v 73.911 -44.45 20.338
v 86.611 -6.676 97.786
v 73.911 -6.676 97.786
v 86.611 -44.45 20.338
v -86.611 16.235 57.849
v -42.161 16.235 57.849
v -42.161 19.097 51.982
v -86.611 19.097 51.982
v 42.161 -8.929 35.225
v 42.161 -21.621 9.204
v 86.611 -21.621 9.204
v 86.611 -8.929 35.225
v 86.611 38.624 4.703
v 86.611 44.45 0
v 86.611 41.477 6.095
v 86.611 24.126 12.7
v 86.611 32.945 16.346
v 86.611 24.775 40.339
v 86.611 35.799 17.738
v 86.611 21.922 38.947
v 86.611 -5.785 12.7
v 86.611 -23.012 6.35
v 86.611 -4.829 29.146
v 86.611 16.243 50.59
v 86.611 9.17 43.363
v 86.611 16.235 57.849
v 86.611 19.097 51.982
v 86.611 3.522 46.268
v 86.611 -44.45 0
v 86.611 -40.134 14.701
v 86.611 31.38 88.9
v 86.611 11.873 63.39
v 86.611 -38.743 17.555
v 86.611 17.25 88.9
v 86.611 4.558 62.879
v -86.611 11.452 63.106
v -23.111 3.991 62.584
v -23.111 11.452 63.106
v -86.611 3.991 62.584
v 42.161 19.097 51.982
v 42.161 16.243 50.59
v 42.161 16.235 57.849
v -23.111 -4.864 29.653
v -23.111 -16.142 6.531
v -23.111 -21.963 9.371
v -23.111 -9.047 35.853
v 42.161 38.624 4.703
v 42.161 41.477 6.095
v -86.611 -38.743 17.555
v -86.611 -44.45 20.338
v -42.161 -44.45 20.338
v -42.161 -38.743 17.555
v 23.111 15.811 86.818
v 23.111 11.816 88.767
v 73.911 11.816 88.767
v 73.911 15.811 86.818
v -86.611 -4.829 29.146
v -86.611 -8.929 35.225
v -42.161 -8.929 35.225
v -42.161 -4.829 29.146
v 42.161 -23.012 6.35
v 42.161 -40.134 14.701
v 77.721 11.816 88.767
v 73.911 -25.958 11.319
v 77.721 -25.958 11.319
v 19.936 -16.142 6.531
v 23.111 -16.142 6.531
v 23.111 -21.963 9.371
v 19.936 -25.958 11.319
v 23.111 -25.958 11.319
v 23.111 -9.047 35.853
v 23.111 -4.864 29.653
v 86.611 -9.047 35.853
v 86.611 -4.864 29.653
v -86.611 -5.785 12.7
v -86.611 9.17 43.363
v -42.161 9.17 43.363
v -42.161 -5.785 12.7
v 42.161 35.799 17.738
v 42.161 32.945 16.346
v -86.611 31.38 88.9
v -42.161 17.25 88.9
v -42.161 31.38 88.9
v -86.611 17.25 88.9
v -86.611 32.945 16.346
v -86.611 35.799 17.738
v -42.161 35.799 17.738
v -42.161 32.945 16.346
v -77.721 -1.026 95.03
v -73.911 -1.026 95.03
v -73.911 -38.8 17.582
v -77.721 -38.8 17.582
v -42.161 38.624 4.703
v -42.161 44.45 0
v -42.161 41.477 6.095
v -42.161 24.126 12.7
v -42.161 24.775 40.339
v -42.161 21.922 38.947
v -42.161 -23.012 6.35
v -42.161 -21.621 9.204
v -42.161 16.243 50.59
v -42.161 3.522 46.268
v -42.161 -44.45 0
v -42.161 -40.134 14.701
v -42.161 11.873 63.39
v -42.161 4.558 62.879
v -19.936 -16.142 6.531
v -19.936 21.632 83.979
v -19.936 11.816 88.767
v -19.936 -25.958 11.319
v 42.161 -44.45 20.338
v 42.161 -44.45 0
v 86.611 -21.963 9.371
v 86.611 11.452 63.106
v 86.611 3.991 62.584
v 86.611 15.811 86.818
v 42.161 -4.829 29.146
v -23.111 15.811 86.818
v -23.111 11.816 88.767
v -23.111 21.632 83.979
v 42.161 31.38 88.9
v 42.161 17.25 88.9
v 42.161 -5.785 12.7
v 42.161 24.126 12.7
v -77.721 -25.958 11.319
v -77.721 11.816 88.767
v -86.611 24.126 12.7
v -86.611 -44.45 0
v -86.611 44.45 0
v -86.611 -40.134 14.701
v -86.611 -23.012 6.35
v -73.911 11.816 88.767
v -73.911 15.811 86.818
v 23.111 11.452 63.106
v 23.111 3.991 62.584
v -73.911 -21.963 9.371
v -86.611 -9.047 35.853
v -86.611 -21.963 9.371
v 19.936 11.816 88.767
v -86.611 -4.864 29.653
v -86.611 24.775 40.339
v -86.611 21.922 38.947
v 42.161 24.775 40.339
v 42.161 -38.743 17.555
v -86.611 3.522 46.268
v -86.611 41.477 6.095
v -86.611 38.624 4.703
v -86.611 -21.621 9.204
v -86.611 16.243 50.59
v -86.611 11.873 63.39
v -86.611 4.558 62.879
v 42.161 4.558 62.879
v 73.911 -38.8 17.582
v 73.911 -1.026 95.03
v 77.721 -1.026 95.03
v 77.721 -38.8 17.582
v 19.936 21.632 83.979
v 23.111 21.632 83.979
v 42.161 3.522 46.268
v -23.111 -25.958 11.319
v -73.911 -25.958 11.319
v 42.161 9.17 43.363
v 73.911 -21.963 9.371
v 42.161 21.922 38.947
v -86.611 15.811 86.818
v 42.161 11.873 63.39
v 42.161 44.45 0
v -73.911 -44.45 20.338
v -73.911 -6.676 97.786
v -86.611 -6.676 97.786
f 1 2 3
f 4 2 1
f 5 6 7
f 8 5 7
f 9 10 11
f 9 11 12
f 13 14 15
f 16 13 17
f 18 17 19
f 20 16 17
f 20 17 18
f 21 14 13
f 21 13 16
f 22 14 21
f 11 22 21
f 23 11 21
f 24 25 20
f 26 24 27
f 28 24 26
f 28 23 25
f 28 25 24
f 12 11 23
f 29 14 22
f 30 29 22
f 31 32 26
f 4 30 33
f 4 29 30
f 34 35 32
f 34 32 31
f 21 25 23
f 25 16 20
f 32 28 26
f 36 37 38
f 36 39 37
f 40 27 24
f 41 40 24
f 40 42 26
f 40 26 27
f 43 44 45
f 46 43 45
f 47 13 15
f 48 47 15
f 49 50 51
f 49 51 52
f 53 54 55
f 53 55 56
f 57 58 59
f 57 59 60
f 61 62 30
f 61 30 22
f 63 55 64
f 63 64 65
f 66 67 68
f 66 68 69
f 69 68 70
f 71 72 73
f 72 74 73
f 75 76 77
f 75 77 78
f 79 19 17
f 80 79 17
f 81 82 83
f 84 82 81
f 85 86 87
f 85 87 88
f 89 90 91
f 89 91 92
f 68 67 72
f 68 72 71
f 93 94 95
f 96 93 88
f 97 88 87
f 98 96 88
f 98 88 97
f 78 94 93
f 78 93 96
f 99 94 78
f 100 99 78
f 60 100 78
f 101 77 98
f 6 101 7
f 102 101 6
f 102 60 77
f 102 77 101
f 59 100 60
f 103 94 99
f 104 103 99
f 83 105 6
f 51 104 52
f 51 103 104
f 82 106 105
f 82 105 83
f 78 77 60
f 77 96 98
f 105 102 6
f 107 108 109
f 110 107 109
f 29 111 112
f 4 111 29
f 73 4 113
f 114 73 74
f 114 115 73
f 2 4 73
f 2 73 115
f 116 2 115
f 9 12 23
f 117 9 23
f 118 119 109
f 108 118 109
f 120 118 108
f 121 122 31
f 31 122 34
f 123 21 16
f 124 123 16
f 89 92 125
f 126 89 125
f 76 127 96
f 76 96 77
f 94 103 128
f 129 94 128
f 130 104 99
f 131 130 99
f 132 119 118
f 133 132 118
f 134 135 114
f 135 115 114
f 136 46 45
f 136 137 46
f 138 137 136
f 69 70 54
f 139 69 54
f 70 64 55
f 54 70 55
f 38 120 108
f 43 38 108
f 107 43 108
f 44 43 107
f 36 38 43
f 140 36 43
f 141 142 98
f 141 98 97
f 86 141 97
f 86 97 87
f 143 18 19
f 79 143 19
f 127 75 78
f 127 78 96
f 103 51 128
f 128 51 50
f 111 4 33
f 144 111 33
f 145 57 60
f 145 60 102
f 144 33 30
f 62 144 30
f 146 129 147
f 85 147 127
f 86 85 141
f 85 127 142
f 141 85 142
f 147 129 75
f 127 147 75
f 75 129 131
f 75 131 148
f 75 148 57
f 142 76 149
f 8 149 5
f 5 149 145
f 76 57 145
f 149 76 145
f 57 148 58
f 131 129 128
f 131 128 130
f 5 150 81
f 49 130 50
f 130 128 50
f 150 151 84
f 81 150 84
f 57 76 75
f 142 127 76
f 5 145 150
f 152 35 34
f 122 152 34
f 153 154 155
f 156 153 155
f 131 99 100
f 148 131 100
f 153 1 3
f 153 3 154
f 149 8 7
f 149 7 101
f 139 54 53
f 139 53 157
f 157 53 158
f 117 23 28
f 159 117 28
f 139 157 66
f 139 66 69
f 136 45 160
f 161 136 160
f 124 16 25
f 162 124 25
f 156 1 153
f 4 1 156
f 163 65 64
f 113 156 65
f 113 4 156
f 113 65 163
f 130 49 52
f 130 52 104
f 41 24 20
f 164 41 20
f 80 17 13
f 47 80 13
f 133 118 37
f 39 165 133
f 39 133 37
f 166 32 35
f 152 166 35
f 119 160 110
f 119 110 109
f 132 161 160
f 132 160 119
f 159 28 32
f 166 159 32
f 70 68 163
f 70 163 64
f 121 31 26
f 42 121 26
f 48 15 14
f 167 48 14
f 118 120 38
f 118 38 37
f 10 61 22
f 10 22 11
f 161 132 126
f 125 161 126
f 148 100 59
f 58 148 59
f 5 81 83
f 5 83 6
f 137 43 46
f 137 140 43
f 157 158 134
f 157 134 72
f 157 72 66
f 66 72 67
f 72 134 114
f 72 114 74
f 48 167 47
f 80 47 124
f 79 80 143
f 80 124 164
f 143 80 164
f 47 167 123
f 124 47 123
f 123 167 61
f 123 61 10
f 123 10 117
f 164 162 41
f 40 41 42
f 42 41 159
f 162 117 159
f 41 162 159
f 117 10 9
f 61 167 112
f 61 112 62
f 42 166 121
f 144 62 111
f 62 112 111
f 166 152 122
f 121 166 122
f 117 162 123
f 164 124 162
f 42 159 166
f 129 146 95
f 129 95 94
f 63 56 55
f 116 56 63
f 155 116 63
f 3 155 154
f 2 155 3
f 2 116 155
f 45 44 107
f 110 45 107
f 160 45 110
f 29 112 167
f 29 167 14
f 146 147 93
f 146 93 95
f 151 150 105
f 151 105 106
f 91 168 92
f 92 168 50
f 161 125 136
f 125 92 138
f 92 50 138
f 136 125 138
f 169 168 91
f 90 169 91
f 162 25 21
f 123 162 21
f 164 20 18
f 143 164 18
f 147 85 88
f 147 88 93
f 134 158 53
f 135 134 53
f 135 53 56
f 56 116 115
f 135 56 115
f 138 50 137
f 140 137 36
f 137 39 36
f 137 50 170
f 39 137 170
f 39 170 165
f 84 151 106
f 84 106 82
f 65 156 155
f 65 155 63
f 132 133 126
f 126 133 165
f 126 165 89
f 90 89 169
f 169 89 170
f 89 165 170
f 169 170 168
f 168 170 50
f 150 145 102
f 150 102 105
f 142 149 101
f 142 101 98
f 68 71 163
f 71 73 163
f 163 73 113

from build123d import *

# Parameters (mm, degrees)
F0_W      = 44.45
F0_H      = 88.9
F1_DEPTH  = 44.45
F3_DEPTH  = 44.45
F5_DEPTH  = 12.7
F7_DEPTH  = 50.8
F9_DEPTH  = 3.175
F10_W     = 3.81
F10_H     = 14.2875
F11_DEPTH = 86.1683560435


with BuildPart() as f1:
    # F0 (on Front) → F1 (new body, symmetric)
    with BuildSketch(Plane.XZ):
        with Locations((64.3862443834, 44.45)):
            Rectangle(F0_W, F0_H)
    extrude(amount=F1_DEPTH, both=True)

    # F2 (on face) → F3 (cut, through all)
    with BuildSketch(Plane.YZ.offset(86.6112443834)):
        Polygon((-44.45, 69.6656666873), (-44.45, 20.3382982254), (-38.742657806, 17.5546414433), (-21.620631224, 9.203671097), (-8.9292081803, 35.2249445186), (-2.1853828265, 49.0518355485), align=None)
        Polygon((-21.620631224, 9.203671097), (-38.742657806, 17.5546414433), (-40.1344861971, 14.7009703463), (-23.0124596151, 6.35), align=None)
        Polygon((-44.45, 88.9), (-44.45, 69.6656666873), (-2.1853828265, 49.0518355485), (4.5584425274, 62.8787265784), (17.2498655711, 88.9), align=None)
        Polygon((3.5219593675, 46.2681787664), (-2.1853828265, 49.0518355485), (-8.9292081803, 35.2249445186), (-4.8290109788, 29.1461521844), align=None)
        Polygon((4.5584425274, 62.8787265784), (-2.1853828265, 49.0518355485), (3.5219593675, 46.2681787664), (11.8729297139, 63.3902053484), align=None)
        Polygon((9.1702192238, 43.3633852402), (-5.7853130336, 12.7), (24.1257514812, 12.7), align=None)
        Polygon((31.3799102151, 88.9), (16.2352415458, 57.8488276479), (19.0966473732, 51.9820762877), (24.7753072087, 40.3390982119), (30.3426207729, 28.9244138239), (44.45, 35.8050424123), (44.45, 88.9), align=None)
        Polygon((24.7753072087, 40.3390982119), (19.0966473732, 51.9820762877), (16.2429762762, 50.5902478967), (21.9216361117, 38.9472698209), align=None)
        Polygon((44.45, 0), (44.45, 35.8050424123), (30.3426207729, 28.9244138239), (35.7985880658, 17.7380231237), (41.4772479013, 6.0950450479), align=None)
        Polygon((41.4772479013, 6.0950450479), (35.7985880658, 17.7380231237), (32.9449169688, 16.3461947327), (38.6235768043, 4.7032166569), align=None)
    extrude(amount=-F3_DEPTH, mode=Mode.SUBTRACT)


with BuildPart() as f5:
    # F4 (on face) → F5 (new body)
    with BuildSketch(Plane.YZ.offset(86.6112443834)):
        Polygon((-4.8644472675, 29.6529147219), (11.451778627, 63.1061353534), (3.9910016968, 62.5844270081), (-9.046648413, 35.8532829028), align=None)
        Polygon((-9.046648413, 35.8532829028), (3.9910016968, 62.5844270081), (15.8106493001, 86.8182958952), (-6.6762789443, 97.7859036168), (-44.45, 20.3382982254), (-21.9630717556, 9.3706905039), align=None)
    extrude(amount=-F5_DEPTH)

    # F6 (on face) → F7 (join)
    with BuildSketch(Plane(origin=(73.9112443834, 0, 0), x_dir=(0, -1, 0), z_dir=(-1, 0, 0))):
        Polygon((-11.8155097643, 88.7668556427), (-15.8106493001, 86.8182958952), (-3.9910016968, 62.5844270081), (-11.451778627, 63.1061353534), (4.8644472675, 29.6529147219), (9.046648413, 35.8532829028), (21.9630717556, 9.3706905039), (25.9582112914, 11.3192502514), align=None)
    extrude(amount=F7_DEPTH)

    # F8 (on face) → F9 (join)
    with BuildSketch(Plane(origin=(23.1112443834, 0, 0), x_dir=(0, -1, 0), z_dir=(-1, 0, 0))):
        Polygon((25.9582112914, 11.3192502514), (-11.8155097643, 88.7668556427), (-21.632138338, 83.9789659775), (16.1415827178, 6.5313605862), align=None)
    extrude(amount=F9_DEPTH)

    # F10 (on face) → F11 (cut, through all)
    with BuildSketch(Plane(origin=(0, 37.2451962007, 76.3639688507), x_dir=(1, 0, 0), z_dir=(0, 0.4383711468, 0.8987940463))):
        with Locations((75.8162443834, -35.4368684748)):
            Rectangle(F10_W, F10_H)
    extrude(amount=-F11_DEPTH, mode=Mode.SUBTRACT)


with BuildPart() as f12_1:
    # F12: instance of F1
    add(f1.part.mirror(Plane.YZ))


with BuildPart() as f12_2:
    # F12: instance of F5
    add(f5.part.mirror(Plane.YZ))


solid = Compound([f1.part, f5.part, f12_1.part, f12_2.part])
